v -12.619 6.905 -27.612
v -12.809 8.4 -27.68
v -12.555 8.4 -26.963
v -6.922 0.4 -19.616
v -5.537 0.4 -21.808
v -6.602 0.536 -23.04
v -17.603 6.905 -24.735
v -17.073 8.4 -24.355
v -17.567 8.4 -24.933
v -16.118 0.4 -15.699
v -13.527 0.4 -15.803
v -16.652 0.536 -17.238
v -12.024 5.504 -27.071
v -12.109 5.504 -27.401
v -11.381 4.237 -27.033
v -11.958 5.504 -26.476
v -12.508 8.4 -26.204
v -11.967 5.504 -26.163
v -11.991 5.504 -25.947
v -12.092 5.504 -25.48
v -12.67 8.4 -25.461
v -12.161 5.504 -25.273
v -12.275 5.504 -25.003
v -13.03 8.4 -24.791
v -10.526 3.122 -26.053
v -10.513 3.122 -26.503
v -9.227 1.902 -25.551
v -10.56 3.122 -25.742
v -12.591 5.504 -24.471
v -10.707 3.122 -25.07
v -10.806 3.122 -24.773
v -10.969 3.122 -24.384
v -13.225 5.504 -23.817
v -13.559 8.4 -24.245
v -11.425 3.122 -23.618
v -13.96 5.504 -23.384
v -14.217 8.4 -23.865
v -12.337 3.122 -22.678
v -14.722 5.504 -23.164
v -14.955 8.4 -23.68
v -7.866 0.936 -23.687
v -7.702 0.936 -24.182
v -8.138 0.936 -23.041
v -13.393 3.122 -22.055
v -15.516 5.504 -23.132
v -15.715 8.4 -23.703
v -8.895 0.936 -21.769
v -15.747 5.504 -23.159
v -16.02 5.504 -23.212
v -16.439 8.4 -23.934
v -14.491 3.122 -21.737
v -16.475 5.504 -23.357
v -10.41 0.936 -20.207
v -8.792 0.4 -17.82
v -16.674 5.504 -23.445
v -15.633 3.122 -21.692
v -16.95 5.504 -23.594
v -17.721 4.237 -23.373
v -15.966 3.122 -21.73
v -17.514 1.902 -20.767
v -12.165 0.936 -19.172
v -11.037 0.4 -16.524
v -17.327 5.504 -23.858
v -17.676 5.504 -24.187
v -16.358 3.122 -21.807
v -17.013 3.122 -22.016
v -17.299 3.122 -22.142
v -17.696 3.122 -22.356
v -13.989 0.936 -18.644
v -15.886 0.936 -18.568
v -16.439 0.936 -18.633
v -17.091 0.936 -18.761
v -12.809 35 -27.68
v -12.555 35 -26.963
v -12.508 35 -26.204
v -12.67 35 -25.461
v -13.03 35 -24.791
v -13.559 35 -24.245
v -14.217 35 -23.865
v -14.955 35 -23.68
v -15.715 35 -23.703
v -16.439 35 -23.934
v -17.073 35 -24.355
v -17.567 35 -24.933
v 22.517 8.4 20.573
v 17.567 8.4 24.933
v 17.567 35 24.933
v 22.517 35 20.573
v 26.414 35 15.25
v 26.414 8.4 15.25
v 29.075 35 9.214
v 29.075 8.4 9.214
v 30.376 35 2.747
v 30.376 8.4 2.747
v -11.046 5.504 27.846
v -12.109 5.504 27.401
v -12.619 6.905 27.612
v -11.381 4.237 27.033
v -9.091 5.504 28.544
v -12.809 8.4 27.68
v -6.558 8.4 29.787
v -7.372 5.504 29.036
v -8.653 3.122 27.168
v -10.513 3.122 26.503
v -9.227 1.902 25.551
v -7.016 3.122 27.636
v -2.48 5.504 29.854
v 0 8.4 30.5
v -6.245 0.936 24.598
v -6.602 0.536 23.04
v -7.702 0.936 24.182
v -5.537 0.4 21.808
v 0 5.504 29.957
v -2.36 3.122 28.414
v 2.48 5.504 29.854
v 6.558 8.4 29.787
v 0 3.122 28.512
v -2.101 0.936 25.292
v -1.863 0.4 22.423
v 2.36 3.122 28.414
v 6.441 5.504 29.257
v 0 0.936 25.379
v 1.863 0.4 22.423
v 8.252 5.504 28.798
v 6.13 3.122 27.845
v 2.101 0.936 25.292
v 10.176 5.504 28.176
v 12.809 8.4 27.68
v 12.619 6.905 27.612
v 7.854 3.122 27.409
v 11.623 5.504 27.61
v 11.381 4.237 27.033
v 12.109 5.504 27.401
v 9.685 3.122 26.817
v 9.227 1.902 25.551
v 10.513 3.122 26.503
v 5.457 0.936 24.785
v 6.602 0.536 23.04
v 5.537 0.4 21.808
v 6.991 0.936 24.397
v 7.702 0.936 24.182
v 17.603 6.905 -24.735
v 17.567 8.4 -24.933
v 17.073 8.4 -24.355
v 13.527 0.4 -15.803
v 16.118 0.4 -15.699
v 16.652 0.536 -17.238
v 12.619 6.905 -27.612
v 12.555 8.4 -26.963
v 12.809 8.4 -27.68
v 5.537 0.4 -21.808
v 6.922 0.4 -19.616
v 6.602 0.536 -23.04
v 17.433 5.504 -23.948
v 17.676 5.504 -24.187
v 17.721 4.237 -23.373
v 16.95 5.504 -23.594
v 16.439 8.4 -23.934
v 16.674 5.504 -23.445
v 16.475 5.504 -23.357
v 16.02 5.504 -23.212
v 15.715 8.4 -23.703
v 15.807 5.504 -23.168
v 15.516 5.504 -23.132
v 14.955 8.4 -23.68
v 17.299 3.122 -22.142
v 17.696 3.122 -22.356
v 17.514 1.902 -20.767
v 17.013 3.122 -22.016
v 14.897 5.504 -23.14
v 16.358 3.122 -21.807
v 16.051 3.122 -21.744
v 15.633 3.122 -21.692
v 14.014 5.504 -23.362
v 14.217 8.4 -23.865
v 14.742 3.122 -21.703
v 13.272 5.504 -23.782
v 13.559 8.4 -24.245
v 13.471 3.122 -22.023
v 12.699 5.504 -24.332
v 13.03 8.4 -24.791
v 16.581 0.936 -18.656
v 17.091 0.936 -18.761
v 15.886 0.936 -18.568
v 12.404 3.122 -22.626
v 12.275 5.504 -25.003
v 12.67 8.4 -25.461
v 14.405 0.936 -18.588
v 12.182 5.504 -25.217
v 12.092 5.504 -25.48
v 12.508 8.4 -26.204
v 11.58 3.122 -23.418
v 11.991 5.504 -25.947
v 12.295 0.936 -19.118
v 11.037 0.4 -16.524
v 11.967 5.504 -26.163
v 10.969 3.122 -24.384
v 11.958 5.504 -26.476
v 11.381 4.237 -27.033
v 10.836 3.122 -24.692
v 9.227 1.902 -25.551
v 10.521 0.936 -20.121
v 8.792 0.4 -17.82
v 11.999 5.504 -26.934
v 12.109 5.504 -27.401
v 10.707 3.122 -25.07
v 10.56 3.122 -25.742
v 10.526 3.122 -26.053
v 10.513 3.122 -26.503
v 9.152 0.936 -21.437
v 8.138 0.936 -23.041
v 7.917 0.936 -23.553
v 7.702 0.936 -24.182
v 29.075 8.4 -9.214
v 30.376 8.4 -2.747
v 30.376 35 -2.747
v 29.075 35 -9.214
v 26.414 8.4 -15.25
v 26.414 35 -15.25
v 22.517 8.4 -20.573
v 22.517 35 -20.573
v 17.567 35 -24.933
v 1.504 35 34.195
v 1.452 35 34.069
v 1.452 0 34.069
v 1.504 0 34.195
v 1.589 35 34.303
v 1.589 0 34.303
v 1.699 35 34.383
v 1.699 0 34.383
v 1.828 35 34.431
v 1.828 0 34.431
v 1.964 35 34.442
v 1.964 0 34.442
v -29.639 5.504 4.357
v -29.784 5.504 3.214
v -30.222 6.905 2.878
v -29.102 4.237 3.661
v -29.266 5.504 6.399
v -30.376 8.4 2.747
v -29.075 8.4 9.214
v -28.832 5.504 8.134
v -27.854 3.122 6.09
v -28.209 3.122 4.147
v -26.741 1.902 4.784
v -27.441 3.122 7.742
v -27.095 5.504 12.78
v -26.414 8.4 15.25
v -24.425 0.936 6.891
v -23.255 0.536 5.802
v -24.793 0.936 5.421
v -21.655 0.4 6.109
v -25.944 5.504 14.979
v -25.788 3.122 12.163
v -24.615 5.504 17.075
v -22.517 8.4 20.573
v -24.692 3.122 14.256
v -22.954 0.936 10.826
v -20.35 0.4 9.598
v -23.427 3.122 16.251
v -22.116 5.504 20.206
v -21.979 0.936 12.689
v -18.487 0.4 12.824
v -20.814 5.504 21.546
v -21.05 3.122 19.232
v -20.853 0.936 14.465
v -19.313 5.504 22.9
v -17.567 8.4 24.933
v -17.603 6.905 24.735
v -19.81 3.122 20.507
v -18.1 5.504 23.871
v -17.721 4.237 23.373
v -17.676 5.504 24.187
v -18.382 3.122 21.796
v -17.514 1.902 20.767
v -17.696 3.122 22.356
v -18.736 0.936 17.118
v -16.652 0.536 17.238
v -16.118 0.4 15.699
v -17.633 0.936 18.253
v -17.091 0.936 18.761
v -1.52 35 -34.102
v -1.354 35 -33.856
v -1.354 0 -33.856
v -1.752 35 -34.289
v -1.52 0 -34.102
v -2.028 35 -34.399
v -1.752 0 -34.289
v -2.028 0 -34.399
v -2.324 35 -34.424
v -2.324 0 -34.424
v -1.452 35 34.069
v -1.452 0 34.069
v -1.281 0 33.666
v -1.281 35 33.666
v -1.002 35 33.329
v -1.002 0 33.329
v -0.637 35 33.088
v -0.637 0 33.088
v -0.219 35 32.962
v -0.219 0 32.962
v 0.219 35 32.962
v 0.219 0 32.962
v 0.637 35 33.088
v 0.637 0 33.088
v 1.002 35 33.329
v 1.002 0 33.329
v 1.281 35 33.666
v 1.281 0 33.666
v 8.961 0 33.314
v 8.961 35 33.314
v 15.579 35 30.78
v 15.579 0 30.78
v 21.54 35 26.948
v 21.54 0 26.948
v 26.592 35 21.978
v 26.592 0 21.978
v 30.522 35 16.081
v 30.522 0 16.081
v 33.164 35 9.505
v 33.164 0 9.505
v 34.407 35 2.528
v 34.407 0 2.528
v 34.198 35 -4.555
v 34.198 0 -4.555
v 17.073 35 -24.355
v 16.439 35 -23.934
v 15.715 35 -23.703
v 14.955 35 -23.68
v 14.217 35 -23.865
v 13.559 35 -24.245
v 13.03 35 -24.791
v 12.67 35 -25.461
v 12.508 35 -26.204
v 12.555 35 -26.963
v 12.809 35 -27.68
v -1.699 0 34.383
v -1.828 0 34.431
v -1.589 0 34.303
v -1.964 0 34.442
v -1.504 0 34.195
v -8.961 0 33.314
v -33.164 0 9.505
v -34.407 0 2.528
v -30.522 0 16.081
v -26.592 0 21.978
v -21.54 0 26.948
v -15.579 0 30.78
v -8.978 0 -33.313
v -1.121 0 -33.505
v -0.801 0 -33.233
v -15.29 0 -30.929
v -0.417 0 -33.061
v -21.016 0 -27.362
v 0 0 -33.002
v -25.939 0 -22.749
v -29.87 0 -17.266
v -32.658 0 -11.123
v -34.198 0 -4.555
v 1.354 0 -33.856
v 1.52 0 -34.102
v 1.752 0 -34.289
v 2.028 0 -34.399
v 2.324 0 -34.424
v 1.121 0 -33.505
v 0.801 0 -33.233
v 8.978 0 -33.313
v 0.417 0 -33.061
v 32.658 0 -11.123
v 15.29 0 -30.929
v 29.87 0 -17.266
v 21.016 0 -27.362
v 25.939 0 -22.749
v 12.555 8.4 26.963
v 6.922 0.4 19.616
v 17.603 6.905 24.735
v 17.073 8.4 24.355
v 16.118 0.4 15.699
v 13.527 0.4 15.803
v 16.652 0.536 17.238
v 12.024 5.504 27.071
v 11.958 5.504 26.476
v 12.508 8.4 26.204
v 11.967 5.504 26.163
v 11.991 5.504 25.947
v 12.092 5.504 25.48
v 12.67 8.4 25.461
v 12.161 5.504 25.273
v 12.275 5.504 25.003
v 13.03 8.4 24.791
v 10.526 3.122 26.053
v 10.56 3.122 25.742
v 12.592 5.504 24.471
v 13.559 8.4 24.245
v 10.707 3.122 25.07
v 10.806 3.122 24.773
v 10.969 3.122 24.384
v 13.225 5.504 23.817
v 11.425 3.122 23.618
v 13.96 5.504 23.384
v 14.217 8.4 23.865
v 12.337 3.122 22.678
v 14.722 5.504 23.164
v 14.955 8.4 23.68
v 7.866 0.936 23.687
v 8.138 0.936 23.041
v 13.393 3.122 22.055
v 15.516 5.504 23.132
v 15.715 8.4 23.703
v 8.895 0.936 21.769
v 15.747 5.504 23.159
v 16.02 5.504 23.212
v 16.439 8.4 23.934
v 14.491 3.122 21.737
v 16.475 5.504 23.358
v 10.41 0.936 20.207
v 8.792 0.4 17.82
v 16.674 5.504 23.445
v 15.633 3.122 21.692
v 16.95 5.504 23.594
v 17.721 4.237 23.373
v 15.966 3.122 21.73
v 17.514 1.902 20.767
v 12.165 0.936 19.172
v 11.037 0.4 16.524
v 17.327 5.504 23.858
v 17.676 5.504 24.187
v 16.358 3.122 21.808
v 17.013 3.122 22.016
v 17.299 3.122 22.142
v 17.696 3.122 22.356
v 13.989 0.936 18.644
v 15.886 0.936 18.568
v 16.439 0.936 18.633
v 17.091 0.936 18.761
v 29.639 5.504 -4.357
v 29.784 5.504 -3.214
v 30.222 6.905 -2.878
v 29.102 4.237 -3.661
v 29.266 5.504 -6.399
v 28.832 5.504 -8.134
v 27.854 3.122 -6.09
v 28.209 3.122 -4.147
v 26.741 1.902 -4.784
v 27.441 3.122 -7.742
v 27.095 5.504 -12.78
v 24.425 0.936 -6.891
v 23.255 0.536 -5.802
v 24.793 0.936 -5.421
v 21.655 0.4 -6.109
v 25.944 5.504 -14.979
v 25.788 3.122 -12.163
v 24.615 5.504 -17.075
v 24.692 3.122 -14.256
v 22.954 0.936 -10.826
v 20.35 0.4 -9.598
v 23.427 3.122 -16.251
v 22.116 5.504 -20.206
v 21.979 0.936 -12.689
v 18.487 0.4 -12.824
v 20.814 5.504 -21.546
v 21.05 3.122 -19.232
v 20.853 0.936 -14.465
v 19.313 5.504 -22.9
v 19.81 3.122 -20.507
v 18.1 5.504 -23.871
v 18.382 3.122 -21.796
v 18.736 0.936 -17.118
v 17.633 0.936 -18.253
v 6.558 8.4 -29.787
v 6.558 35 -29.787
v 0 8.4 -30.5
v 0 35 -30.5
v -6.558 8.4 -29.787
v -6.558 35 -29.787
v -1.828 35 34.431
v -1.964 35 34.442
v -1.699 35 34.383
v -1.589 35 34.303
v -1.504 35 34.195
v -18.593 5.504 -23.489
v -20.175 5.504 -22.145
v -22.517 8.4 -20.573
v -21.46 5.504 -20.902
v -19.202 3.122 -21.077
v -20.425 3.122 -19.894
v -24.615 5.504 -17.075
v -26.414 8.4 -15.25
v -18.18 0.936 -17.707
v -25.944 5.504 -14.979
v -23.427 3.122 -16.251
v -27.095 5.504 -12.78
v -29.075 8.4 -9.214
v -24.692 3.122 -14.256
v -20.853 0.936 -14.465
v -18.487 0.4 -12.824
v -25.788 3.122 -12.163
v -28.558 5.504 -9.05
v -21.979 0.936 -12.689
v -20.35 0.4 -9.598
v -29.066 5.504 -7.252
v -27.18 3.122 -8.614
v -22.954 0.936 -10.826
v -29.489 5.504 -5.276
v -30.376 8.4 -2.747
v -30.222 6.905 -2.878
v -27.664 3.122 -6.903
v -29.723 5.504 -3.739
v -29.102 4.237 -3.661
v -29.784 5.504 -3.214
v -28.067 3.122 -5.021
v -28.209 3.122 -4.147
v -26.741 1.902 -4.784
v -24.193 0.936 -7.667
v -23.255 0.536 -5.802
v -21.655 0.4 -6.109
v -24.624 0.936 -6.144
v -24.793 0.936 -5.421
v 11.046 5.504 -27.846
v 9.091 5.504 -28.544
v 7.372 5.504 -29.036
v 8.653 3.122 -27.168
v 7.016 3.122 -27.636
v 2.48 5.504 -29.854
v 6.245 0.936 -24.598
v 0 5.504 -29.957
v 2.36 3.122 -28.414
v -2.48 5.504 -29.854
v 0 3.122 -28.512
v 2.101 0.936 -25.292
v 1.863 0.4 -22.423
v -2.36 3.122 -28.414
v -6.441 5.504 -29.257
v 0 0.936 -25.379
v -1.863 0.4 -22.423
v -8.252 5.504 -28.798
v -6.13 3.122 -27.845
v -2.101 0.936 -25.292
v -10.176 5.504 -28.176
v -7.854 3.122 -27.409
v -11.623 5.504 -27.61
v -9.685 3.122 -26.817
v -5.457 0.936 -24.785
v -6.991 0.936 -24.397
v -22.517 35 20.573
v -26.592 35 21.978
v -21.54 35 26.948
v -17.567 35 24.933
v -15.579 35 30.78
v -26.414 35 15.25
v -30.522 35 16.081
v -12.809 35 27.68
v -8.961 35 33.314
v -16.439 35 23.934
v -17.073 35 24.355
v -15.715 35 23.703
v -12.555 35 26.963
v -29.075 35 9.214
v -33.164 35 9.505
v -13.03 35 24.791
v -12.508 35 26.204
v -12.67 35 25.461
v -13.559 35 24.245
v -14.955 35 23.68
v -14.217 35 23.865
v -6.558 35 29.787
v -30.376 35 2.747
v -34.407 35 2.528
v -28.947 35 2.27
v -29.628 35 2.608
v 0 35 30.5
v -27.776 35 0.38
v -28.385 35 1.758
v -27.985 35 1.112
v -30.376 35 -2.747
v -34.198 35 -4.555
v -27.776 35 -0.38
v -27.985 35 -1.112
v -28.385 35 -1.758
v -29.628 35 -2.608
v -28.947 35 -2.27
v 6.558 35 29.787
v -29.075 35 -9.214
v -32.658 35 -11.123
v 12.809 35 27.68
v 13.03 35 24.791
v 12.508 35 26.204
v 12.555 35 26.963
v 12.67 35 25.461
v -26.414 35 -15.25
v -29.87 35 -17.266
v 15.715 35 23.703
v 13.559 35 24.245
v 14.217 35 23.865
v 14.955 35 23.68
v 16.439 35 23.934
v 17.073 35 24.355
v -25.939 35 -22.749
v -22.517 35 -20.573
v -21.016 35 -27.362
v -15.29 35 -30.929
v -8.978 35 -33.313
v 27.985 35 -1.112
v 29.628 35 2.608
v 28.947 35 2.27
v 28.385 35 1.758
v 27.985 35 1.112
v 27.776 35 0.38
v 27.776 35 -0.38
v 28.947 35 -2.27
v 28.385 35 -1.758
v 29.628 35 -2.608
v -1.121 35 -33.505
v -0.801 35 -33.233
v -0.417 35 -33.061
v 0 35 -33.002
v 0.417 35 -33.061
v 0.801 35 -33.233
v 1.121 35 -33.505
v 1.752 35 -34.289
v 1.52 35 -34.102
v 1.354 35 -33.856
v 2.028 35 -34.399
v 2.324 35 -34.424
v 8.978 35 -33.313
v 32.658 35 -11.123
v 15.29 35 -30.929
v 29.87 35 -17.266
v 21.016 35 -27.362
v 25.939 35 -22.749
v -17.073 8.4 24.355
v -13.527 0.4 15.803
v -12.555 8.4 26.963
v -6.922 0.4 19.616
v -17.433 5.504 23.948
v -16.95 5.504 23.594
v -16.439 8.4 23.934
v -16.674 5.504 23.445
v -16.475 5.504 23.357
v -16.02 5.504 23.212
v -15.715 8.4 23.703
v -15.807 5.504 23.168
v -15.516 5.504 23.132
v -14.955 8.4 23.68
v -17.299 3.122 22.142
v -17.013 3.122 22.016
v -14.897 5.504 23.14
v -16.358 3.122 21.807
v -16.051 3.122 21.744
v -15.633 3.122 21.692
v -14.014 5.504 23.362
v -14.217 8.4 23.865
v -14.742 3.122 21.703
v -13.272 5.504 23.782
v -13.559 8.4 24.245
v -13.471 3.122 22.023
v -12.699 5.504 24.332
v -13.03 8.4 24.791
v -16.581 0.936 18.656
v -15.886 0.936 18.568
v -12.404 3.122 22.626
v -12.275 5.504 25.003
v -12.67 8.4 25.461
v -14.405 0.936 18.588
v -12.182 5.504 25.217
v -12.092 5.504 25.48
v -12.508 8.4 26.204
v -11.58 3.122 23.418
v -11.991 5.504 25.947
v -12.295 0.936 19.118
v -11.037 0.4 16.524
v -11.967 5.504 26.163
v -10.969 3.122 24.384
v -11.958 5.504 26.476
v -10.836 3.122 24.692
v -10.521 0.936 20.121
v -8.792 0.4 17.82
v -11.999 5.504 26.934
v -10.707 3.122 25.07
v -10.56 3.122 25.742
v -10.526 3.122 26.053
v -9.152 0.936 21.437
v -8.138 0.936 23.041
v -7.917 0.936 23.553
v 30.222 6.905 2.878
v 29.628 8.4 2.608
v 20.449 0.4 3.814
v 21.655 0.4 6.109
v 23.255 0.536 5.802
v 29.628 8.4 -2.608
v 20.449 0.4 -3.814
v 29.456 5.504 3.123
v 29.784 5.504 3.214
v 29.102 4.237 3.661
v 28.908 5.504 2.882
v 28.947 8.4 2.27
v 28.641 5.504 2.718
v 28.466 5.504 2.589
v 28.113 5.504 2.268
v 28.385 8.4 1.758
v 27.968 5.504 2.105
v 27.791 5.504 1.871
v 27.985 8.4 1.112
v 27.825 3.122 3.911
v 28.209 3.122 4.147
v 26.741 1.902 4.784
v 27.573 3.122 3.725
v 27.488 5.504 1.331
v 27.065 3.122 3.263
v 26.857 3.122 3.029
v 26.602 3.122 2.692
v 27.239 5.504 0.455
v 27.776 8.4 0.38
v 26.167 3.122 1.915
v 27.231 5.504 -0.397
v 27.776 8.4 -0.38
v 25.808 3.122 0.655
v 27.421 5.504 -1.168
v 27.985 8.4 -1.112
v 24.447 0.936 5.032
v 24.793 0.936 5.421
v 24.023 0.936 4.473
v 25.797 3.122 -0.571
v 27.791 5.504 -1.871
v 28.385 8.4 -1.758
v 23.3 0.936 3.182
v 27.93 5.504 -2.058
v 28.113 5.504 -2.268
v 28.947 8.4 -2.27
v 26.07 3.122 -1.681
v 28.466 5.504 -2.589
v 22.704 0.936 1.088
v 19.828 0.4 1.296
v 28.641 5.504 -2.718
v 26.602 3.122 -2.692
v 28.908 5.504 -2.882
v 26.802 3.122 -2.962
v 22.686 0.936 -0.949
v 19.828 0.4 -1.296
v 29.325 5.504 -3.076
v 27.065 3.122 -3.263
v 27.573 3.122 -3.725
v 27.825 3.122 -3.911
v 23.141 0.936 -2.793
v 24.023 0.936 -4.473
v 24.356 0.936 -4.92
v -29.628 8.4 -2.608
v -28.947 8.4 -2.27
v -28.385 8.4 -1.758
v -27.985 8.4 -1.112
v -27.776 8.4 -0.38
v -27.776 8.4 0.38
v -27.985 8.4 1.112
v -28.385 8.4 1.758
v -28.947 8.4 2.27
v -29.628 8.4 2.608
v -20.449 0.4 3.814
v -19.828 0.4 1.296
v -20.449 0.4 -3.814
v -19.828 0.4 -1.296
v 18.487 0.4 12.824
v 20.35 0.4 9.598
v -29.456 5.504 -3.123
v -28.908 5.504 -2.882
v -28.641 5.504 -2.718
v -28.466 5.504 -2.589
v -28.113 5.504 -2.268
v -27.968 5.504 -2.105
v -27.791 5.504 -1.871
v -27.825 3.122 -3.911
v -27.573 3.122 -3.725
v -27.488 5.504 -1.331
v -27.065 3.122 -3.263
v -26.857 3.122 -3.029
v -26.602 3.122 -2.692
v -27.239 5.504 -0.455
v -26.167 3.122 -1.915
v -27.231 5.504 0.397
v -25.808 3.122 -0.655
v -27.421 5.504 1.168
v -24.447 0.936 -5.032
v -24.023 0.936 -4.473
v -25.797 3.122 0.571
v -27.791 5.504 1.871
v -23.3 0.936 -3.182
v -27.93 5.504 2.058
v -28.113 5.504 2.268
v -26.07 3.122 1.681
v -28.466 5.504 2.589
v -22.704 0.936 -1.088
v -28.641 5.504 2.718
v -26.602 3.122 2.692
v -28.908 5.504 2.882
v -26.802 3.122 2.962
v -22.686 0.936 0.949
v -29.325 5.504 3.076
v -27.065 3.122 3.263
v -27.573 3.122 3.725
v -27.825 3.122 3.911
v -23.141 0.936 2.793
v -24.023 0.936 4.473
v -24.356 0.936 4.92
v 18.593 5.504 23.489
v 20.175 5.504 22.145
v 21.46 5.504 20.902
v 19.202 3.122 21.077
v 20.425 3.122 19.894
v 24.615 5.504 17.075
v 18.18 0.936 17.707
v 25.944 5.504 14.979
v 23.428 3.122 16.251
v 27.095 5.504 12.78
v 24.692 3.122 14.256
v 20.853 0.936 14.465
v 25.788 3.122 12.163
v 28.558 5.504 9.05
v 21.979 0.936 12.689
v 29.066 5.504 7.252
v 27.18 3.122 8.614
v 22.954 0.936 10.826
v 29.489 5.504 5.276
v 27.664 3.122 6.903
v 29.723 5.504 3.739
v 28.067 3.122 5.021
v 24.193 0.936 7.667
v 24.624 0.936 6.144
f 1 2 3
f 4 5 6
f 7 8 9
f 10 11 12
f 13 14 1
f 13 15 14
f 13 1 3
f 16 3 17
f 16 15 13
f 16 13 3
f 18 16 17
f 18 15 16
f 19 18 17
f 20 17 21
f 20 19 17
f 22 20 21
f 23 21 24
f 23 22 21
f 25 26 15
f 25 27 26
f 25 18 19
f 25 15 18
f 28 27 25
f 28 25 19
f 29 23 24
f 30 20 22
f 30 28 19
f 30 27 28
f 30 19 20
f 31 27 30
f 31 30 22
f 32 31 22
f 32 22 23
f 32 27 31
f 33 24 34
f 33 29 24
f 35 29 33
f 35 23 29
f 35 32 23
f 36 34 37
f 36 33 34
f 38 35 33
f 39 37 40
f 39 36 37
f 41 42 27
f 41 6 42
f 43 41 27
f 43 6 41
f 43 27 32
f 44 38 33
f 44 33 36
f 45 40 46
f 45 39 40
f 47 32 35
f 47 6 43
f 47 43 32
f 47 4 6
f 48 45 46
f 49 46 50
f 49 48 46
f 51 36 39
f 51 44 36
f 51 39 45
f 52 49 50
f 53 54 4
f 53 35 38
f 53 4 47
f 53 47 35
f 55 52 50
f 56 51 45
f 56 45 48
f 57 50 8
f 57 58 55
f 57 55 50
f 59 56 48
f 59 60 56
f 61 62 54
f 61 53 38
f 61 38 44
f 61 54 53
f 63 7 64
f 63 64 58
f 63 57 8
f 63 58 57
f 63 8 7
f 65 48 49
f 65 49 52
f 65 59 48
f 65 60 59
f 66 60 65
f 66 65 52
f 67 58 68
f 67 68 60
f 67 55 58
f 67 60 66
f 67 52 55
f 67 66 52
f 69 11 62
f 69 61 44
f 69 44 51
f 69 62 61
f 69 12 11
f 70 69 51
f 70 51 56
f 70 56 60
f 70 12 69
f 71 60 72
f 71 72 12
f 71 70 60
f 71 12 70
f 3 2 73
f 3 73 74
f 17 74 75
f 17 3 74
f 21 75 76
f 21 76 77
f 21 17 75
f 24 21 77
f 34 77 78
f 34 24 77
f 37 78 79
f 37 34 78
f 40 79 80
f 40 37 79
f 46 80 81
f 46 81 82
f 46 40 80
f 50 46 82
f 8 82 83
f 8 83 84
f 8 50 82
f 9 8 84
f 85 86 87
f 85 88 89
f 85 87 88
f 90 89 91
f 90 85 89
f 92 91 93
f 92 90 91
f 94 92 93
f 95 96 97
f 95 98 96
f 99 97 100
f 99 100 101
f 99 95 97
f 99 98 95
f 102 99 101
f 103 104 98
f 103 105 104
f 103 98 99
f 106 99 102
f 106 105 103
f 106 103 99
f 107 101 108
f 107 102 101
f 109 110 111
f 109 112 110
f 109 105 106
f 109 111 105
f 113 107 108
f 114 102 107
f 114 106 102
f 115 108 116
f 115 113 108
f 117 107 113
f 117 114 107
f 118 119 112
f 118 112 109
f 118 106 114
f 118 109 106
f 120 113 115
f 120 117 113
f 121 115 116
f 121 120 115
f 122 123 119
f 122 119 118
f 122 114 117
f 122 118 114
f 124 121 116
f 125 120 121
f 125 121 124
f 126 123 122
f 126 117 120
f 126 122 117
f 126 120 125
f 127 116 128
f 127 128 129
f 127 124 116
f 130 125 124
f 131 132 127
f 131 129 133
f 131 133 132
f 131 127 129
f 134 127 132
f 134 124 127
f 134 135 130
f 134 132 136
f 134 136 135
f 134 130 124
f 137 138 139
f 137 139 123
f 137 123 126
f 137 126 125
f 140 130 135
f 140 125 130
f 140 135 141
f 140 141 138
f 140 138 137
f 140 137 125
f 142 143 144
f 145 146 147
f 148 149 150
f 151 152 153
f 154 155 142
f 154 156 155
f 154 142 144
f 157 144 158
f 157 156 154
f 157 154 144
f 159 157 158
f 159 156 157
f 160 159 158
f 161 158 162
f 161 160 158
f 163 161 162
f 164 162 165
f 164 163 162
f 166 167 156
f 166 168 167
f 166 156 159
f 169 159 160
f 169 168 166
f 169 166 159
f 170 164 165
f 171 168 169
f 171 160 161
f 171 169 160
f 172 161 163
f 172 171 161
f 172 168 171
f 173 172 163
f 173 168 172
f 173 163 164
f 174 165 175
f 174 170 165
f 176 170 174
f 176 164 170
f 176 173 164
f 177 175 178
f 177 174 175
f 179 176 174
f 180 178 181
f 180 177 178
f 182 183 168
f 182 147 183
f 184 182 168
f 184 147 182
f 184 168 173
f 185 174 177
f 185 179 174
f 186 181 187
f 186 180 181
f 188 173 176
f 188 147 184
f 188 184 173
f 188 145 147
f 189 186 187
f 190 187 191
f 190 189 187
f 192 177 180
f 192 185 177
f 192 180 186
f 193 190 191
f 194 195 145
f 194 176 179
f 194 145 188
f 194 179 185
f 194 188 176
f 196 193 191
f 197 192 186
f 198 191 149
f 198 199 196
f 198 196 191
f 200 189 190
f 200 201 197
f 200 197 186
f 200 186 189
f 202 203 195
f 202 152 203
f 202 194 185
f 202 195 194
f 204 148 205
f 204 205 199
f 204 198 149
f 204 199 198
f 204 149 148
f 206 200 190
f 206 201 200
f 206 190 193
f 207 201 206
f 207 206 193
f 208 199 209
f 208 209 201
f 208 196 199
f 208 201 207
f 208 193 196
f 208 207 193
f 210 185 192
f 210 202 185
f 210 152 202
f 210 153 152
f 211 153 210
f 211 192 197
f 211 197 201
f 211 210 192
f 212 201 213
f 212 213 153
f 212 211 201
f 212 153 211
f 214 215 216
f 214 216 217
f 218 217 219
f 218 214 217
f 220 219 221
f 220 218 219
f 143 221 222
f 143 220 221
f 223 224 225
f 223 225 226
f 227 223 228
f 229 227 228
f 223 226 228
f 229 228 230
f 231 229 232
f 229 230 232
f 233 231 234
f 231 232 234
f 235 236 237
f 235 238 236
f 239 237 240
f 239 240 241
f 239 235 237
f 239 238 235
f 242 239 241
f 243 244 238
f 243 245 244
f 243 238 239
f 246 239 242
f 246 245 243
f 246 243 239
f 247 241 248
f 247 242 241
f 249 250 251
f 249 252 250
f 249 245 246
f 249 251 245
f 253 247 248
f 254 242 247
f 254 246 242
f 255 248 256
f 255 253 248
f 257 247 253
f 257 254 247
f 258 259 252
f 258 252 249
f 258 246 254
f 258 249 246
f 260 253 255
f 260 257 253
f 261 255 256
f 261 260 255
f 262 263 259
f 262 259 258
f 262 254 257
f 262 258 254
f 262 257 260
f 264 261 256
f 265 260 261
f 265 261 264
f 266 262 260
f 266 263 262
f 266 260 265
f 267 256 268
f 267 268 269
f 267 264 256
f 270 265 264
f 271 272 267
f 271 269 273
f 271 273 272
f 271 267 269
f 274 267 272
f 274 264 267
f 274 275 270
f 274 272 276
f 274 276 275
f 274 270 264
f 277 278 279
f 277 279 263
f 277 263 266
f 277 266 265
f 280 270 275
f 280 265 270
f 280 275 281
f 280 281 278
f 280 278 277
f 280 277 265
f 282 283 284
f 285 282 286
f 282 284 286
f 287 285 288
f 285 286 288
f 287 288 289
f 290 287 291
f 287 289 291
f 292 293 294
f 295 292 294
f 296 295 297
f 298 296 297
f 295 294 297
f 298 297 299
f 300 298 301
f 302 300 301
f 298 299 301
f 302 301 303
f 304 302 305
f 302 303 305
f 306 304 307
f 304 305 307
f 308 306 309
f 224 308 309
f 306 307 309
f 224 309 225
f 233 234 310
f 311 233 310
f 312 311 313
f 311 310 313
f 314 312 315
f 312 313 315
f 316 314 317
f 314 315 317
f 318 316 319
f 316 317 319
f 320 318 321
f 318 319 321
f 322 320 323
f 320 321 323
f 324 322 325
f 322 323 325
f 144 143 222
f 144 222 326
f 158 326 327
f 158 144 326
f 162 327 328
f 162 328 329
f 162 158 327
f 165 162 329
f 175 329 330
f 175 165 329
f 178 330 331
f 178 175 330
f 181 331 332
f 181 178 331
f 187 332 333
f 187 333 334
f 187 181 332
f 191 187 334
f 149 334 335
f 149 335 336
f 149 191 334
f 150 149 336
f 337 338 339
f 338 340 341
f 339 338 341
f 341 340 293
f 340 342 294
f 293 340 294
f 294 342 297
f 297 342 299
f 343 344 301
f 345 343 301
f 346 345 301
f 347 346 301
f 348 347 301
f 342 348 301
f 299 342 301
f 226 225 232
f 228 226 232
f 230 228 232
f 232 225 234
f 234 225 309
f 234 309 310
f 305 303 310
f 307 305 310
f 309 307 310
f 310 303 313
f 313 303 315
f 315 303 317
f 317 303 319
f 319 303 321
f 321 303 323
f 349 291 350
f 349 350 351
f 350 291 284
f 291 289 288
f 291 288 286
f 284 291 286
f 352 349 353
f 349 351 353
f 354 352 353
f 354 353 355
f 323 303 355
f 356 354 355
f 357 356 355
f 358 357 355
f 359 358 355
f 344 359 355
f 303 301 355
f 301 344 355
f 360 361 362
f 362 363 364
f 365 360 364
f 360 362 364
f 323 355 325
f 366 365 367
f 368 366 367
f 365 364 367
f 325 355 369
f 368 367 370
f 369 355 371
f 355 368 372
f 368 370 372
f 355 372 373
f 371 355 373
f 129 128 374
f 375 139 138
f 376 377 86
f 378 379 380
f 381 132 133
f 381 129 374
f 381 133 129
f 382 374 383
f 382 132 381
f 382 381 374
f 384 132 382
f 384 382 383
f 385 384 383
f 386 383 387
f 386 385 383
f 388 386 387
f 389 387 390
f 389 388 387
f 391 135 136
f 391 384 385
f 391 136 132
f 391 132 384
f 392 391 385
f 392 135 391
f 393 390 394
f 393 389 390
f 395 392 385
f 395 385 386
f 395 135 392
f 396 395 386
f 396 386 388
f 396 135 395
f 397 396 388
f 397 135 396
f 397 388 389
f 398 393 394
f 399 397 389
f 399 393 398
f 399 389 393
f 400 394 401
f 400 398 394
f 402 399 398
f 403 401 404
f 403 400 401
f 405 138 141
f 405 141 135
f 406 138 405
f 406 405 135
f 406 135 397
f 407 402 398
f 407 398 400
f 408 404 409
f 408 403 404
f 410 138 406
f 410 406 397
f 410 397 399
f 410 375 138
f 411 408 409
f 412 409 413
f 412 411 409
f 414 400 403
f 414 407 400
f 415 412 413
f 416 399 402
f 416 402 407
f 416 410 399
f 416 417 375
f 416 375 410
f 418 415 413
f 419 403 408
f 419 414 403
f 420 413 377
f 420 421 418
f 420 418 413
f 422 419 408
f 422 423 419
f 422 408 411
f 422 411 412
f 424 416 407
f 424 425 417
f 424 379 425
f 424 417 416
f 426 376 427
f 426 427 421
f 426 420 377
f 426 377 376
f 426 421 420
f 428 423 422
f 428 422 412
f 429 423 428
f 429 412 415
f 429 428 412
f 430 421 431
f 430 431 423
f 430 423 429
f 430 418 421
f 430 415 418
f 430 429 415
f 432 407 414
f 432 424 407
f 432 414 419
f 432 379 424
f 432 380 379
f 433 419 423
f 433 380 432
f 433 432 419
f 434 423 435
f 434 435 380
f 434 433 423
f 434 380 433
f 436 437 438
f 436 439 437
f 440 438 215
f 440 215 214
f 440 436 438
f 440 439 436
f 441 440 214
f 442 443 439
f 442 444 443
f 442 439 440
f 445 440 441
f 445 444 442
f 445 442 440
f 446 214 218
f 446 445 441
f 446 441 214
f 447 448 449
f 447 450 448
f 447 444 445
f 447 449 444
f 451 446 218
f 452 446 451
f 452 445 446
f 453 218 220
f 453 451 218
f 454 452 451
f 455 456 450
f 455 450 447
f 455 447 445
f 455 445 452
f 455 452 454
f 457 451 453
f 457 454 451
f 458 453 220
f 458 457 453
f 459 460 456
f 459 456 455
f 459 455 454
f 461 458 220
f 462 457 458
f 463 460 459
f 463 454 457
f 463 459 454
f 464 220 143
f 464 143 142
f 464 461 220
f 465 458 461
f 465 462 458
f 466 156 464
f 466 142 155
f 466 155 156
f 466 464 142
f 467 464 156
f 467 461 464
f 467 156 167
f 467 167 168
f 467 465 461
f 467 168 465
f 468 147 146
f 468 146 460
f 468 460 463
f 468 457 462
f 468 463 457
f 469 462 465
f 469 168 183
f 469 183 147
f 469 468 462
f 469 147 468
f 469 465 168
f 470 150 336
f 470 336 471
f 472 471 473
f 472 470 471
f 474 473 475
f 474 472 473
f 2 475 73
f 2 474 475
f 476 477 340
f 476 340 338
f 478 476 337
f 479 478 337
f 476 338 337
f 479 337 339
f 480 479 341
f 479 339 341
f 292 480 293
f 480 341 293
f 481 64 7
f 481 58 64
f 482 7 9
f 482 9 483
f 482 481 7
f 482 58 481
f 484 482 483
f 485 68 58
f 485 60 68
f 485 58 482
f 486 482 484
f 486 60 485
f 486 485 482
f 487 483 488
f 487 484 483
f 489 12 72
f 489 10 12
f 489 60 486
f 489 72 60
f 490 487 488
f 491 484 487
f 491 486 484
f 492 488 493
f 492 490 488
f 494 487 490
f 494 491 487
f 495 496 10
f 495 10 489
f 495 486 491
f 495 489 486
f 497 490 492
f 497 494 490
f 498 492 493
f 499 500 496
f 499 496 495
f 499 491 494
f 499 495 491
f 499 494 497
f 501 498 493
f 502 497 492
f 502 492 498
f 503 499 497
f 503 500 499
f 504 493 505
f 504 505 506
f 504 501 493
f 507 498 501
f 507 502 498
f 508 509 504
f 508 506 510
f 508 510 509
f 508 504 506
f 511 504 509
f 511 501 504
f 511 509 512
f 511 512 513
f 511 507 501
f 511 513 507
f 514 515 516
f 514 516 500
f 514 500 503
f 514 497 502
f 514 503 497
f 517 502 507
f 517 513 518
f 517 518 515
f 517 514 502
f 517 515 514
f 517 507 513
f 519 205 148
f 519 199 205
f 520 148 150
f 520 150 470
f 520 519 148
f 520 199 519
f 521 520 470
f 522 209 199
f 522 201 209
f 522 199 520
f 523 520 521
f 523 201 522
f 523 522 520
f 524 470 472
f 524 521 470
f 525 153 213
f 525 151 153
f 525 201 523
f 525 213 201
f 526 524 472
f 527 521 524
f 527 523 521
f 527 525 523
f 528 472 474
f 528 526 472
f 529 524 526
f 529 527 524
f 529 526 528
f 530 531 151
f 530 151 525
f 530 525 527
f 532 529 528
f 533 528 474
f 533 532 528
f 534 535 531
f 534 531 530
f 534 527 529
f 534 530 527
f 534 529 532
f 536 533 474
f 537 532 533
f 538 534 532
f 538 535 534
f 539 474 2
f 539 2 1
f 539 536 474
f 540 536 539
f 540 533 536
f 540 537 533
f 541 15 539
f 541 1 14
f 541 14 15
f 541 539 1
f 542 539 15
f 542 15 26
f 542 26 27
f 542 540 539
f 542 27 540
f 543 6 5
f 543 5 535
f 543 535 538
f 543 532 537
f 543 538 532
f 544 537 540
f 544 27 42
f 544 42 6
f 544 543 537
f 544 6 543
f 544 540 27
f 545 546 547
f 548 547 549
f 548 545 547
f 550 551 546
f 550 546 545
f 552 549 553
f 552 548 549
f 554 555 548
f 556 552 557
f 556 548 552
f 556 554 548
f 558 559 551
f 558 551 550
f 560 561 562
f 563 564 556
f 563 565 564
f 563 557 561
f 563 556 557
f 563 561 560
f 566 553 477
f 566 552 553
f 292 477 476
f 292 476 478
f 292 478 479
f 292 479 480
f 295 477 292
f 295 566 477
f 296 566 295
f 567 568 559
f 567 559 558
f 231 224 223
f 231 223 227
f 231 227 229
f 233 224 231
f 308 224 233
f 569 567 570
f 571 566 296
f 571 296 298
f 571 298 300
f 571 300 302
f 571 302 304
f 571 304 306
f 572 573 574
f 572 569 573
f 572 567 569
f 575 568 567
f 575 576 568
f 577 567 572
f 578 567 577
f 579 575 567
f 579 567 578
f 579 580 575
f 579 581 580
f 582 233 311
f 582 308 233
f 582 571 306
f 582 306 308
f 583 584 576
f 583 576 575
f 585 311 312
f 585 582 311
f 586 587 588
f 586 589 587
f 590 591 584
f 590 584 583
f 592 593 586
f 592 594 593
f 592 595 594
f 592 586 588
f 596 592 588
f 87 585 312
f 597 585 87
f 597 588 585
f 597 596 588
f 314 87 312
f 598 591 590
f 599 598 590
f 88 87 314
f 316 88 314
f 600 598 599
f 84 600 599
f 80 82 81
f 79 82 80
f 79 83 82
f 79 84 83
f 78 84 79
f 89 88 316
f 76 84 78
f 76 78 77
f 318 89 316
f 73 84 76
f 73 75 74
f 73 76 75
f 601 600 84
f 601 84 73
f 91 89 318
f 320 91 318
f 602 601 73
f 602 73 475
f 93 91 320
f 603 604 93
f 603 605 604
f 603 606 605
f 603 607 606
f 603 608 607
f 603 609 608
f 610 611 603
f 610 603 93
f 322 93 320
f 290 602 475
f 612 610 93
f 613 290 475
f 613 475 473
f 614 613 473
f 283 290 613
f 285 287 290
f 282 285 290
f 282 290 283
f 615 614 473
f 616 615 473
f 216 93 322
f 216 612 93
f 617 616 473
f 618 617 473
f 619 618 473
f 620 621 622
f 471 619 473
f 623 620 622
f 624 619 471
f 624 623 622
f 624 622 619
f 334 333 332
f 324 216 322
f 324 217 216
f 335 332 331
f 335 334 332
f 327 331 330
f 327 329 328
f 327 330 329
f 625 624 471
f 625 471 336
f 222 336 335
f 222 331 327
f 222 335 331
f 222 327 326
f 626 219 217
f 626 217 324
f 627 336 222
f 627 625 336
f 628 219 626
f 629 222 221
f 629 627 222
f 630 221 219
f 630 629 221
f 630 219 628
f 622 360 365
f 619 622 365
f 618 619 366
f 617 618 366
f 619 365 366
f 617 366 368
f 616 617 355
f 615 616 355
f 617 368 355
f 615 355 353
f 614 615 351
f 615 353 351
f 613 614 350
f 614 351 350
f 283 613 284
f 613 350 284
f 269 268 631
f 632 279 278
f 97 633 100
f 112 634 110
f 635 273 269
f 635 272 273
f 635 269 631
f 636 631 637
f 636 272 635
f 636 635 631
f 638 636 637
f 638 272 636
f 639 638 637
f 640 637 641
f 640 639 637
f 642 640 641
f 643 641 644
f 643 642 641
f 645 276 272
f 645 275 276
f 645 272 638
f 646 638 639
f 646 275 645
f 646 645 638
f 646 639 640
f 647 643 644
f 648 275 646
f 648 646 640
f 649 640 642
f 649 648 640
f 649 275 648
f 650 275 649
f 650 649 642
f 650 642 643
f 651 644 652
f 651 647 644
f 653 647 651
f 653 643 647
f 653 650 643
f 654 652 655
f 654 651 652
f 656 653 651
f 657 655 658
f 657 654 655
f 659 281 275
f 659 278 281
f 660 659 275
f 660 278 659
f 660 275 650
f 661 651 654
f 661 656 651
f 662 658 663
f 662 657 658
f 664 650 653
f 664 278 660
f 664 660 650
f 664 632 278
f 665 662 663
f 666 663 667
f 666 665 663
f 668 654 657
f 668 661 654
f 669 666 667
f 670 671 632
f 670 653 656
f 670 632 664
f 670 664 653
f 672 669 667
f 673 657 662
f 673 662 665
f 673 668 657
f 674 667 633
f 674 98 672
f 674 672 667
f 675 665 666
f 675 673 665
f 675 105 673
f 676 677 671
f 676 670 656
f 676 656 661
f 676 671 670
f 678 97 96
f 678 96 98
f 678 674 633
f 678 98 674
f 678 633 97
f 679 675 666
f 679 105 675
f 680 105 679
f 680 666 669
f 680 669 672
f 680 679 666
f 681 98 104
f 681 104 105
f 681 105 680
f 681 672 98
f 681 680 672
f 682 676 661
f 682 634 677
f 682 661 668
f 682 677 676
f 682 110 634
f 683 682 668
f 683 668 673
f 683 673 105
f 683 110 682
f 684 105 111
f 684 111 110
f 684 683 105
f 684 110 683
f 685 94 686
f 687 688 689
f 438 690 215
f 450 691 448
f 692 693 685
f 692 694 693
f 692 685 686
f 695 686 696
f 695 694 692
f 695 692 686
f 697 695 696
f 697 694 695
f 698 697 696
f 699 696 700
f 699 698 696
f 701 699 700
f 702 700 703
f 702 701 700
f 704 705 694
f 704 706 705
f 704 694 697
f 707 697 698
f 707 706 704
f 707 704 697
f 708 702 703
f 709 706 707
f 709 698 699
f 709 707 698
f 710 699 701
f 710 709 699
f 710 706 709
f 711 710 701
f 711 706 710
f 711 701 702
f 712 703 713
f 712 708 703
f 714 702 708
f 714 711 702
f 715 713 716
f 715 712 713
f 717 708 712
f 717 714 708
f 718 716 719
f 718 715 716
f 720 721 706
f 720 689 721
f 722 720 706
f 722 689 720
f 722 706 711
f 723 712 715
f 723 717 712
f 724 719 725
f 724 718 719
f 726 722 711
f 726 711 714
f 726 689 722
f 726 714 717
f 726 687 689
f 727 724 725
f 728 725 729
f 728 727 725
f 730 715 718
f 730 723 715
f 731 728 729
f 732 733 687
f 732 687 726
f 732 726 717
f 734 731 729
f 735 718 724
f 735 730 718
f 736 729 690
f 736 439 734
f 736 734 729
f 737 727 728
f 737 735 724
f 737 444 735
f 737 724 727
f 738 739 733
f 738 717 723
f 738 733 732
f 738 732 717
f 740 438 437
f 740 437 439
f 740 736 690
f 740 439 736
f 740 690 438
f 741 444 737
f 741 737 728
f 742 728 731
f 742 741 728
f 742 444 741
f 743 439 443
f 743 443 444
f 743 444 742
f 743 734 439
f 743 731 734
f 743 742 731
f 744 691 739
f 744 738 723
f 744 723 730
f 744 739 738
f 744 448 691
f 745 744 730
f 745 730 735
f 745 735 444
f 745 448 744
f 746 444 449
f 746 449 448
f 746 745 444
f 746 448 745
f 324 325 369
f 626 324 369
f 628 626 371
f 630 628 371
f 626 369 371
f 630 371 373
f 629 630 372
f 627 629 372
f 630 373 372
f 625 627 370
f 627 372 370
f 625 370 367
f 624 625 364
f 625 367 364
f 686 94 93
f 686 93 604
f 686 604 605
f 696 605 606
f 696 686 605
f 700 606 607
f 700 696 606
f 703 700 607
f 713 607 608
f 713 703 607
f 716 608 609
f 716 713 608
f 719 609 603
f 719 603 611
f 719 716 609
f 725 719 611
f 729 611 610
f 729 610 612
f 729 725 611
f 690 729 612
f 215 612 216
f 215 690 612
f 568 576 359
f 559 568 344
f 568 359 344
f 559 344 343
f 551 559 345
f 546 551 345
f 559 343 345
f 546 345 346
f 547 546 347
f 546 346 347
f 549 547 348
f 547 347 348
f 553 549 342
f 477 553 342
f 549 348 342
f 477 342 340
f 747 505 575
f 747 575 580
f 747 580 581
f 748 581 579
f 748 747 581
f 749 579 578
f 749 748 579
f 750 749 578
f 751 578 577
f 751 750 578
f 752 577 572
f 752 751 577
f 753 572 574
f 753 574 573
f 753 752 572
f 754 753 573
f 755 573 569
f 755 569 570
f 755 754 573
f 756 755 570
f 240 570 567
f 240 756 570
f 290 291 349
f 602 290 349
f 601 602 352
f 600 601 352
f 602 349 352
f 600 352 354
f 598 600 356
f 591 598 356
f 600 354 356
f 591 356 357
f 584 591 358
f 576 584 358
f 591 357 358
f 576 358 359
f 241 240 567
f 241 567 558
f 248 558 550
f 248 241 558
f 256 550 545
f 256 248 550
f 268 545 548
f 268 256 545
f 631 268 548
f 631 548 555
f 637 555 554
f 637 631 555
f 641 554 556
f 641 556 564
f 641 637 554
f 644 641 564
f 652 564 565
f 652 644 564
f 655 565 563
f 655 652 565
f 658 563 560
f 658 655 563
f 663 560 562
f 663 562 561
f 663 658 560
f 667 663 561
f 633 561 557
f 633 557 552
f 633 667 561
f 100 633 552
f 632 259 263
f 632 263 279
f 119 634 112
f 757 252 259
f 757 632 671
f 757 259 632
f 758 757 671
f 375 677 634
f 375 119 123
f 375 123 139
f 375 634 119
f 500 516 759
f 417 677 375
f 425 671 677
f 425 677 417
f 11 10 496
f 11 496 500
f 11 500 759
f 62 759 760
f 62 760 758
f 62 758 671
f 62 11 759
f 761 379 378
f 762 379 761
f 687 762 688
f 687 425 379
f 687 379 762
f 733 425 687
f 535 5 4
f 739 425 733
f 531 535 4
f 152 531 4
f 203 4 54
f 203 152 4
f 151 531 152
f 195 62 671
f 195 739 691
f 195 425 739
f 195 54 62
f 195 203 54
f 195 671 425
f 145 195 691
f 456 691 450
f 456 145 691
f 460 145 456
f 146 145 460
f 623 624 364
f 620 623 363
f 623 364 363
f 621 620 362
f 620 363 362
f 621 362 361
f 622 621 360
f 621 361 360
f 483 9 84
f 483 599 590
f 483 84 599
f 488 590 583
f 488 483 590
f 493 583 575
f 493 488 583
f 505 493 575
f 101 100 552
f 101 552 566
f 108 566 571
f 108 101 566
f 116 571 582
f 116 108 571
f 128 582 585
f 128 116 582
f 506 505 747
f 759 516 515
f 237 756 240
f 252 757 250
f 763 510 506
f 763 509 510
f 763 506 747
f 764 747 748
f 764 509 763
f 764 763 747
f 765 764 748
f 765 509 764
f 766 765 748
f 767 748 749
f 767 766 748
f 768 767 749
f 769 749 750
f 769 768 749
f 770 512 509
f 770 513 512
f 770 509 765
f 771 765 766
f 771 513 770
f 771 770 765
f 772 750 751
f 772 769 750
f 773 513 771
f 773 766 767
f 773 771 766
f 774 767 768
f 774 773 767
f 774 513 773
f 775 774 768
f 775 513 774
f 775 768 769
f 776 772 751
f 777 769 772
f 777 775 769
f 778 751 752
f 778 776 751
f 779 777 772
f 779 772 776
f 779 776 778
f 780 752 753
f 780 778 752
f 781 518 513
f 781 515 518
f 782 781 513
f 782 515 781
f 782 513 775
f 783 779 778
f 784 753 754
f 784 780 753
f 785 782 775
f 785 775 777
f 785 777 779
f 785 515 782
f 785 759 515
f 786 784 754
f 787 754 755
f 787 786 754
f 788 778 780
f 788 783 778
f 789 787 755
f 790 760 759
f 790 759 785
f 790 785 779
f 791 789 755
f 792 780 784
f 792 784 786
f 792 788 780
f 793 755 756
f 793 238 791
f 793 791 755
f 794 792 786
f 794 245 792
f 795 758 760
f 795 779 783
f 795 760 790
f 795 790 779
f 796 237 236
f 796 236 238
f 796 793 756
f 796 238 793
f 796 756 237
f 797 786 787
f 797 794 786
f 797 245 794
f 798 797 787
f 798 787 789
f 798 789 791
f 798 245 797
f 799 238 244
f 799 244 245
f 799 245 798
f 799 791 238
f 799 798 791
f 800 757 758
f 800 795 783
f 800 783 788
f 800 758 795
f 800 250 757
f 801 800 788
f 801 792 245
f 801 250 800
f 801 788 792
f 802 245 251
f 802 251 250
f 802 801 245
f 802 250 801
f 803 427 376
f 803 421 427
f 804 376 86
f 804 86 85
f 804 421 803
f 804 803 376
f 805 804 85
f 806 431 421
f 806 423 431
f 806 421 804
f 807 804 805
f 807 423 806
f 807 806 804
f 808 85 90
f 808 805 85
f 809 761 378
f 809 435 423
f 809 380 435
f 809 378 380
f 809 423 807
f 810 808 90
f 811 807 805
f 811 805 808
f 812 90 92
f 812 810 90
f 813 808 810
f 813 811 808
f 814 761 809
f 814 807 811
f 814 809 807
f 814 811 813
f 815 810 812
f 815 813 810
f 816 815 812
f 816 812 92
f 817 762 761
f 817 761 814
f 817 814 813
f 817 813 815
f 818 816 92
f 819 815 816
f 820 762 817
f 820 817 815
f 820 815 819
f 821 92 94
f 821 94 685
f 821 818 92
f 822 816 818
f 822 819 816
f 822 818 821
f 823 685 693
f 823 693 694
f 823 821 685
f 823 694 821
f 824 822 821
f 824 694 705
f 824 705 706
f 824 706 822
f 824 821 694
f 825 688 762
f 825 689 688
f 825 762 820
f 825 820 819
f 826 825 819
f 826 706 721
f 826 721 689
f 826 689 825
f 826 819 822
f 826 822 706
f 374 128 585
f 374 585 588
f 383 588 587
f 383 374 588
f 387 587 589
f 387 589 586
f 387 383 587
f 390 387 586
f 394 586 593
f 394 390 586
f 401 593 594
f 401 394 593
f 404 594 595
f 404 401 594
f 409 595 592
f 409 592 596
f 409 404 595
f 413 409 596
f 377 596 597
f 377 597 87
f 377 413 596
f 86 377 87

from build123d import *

# Parameters (mm, degrees)
BOSS_EXTRUDE1_DEPTH = 35
CUT_EXTRUDE2_DEPTH  = 36
BOSS_EXTRUDE2_DEPTH = 0.4
FILLET1_R           = 8


with BuildPart() as part:
    # Sketch1 → Boss-Extrude1 (new body)
    with BuildSketch(Plane(origin=(0, 0, 0), x_dir=(1, 0, 0), z_dir=(0, 1, 0))):
        with BuildLine():
            ThreePointArc((1.451818925, -34.068556857), (1.641248992, -34.346908706), (1.964225605, -34.442038138))
            ThreePointArc((1.964225605, -34.442038138), (26.591847487, -21.978073076), (34.198225299, 4.555174015))
            ThreePointArc((34.198225299, 4.555174015), (23.590291339, 25.176355888), (2.324135821, 34.423627607))
            ThreePointArc((2.324135821, 34.423627607), (1.751838249, 34.289058819), (1.354061739, 33.856153382))
            ThreePointArc((1.354061739, 33.856153382), (0, 33.001534515), (-1.354061739, 33.856153382))
            ThreePointArc((-1.354061739, 33.856153382), (-1.751838249, 34.289058819), (-2.324135821, 34.423627607))
            ThreePointArc((-2.324135821, 34.423627607), (-23.590291339, 25.176355888), (-34.198225299, 4.555174015))
            ThreePointArc((-34.198225299, 4.555174015), (-26.591847487, -21.978073076), (-1.964225605, -34.442038138))
            ThreePointArc((-1.964225605, -34.442038138), (-1.641248992, -34.346908706), (-1.451818925, -34.068556857))
            ThreePointArc((-1.451818925, -34.068556857), (0, -32.945679925), (1.451818925, -34.068556857))
        make_face()
        with BuildLine():
            Line((-2.417, 3.787737139), (0, 3.787737139))
            Line((0, 3.787737139), (2.417, 3.787737139))
            ThreePointArc((2.417, 3.787737139), (0, -4.489512172), (-2.417, 3.787737139))
        make_face(mode=Mode.SUBTRACT)
    extrude(amount=BOSS_EXTRUDE1_DEPTH)

    # Sketch2 → Cut-Extrude2 (cut, through all)
    with BuildSketch(Plane(origin=(0, 0, 0), x_dir=(1, 0, 0), z_dir=(0, 1, 0))):
        with BuildLine():
            ThreePointArc((-17.567160793, 24.932806936), (-26.413774815, 15.25), (-30.37602459, 2.747204051))
            ThreePointArc((-30.37602459, 2.747204051), (-27.75, 0), (-30.37602459, -2.747204051))
            ThreePointArc((-30.37602459, -2.747204051), (-26.413774815, -15.25), (-17.567160793, -24.932806936))
            ThreePointArc((-17.567160793, -24.932806936), (-13.875, -24.032204955), (-12.808863798, -27.680010987))
            ThreePointArc((-12.808863798, -27.680010987), (0, -30.5), (12.808863798, -27.680010987))
            ThreePointArc((12.808863798, -27.680010987), (13.875, -24.032204955), (17.567160793, -24.932806936))
            ThreePointArc((17.567160793, -24.932806936), (26.413774815, -15.25), (30.37602459, -2.747204051))
            ThreePointArc((30.37602459, -2.747204051), (27.75, 0), (30.37602459, 2.747204051))
            ThreePointArc((30.37602459, 2.747204051), (26.413774815, 15.25), (17.567160793, 24.932806936))
            ThreePointArc((17.567160793, 24.932806936), (13.875, 24.032204955), (12.808863798, 27.680010987))
            ThreePointArc((12.808863798, 27.680010987), (0, 30.5), (-12.808863798, 27.680010987))
            ThreePointArc((-12.808863798, 27.680010987), (-13.875, 24.032204955), (-17.567160793, 24.932806936))
        make_face()
    extrude(amount=CUT_EXTRUDE2_DEPTH, mode=Mode.SUBTRACT)

    # Sketch2<2> → Boss-Extrude2 (add)
    with BuildSketch(Plane(origin=(0, 0, 0), x_dir=(1, 0, 0), z_dir=(0, 1, 0))):
        with BuildLine():
            ThreePointArc((-17.567160793, 24.932806936), (-26.413774815, 15.25), (-30.37602459, 2.747204051))
            ThreePointArc((-30.37602459, 2.747204051), (-27.75, 0), (-30.37602459, -2.747204051))
            ThreePointArc((-30.37602459, -2.747204051), (-26.413774815, -15.25), (-17.567160793, -24.932806936))
            ThreePointArc((-17.567160793, -24.932806936), (-13.875, -24.032204955), (-12.808863798, -27.680010987))
            ThreePointArc((-12.808863798, -27.680010987), (0, -30.5), (12.808863798, -27.680010987))
            ThreePointArc((12.808863798, -27.680010987), (13.875, -24.032204955), (17.567160793, -24.932806936))
            ThreePointArc((17.567160793, -24.932806936), (26.413774815, -15.25), (30.37602459, -2.747204051))
            ThreePointArc((30.37602459, -2.747204051), (27.75, 0), (30.37602459, 2.747204051))
            ThreePointArc((30.37602459, 2.747204051), (26.413774815, 15.25), (17.567160793, 24.932806936))
            ThreePointArc((17.567160793, 24.932806936), (13.875, 24.032204955), (12.808863798, 27.680010987))
            ThreePointArc((12.808863798, 27.680010987), (0, 30.5), (-12.808863798, 27.680010987))
            ThreePointArc((-12.808863798, 27.680010987), (-13.875, 24.032204955), (-17.567160793, 24.932806936))
        make_face()
    extrude(amount=BOSS_EXTRUDE2_DEPTH)

    # Fillet1
    fillet1_edges = [part.edges().sort_by_distance(p)[0] for p in [
        (26.413774815, 0.4, 15.25),
        (27.75, 0.4, 0),
        (26.413774815, 0.4, -15.25),
        (13.875, 0.4, -24.032204955),
        (0, 0.4, -30.5),
        (-13.875, 0.4, -24.032204955),
        (-26.413774815, 0.4, -15.25),
        (-27.75, 0.4, 0),
        (-26.413774815, 0.4, 15.25),
        (-13.875, 0.4, 24.032204955),
        (0, 0.4, 30.5),
        (13.875, 0.4, 24.032204955),
    ]]
    fillet(fillet1_edges, radius=FILLET1_R)


solid = part.part
